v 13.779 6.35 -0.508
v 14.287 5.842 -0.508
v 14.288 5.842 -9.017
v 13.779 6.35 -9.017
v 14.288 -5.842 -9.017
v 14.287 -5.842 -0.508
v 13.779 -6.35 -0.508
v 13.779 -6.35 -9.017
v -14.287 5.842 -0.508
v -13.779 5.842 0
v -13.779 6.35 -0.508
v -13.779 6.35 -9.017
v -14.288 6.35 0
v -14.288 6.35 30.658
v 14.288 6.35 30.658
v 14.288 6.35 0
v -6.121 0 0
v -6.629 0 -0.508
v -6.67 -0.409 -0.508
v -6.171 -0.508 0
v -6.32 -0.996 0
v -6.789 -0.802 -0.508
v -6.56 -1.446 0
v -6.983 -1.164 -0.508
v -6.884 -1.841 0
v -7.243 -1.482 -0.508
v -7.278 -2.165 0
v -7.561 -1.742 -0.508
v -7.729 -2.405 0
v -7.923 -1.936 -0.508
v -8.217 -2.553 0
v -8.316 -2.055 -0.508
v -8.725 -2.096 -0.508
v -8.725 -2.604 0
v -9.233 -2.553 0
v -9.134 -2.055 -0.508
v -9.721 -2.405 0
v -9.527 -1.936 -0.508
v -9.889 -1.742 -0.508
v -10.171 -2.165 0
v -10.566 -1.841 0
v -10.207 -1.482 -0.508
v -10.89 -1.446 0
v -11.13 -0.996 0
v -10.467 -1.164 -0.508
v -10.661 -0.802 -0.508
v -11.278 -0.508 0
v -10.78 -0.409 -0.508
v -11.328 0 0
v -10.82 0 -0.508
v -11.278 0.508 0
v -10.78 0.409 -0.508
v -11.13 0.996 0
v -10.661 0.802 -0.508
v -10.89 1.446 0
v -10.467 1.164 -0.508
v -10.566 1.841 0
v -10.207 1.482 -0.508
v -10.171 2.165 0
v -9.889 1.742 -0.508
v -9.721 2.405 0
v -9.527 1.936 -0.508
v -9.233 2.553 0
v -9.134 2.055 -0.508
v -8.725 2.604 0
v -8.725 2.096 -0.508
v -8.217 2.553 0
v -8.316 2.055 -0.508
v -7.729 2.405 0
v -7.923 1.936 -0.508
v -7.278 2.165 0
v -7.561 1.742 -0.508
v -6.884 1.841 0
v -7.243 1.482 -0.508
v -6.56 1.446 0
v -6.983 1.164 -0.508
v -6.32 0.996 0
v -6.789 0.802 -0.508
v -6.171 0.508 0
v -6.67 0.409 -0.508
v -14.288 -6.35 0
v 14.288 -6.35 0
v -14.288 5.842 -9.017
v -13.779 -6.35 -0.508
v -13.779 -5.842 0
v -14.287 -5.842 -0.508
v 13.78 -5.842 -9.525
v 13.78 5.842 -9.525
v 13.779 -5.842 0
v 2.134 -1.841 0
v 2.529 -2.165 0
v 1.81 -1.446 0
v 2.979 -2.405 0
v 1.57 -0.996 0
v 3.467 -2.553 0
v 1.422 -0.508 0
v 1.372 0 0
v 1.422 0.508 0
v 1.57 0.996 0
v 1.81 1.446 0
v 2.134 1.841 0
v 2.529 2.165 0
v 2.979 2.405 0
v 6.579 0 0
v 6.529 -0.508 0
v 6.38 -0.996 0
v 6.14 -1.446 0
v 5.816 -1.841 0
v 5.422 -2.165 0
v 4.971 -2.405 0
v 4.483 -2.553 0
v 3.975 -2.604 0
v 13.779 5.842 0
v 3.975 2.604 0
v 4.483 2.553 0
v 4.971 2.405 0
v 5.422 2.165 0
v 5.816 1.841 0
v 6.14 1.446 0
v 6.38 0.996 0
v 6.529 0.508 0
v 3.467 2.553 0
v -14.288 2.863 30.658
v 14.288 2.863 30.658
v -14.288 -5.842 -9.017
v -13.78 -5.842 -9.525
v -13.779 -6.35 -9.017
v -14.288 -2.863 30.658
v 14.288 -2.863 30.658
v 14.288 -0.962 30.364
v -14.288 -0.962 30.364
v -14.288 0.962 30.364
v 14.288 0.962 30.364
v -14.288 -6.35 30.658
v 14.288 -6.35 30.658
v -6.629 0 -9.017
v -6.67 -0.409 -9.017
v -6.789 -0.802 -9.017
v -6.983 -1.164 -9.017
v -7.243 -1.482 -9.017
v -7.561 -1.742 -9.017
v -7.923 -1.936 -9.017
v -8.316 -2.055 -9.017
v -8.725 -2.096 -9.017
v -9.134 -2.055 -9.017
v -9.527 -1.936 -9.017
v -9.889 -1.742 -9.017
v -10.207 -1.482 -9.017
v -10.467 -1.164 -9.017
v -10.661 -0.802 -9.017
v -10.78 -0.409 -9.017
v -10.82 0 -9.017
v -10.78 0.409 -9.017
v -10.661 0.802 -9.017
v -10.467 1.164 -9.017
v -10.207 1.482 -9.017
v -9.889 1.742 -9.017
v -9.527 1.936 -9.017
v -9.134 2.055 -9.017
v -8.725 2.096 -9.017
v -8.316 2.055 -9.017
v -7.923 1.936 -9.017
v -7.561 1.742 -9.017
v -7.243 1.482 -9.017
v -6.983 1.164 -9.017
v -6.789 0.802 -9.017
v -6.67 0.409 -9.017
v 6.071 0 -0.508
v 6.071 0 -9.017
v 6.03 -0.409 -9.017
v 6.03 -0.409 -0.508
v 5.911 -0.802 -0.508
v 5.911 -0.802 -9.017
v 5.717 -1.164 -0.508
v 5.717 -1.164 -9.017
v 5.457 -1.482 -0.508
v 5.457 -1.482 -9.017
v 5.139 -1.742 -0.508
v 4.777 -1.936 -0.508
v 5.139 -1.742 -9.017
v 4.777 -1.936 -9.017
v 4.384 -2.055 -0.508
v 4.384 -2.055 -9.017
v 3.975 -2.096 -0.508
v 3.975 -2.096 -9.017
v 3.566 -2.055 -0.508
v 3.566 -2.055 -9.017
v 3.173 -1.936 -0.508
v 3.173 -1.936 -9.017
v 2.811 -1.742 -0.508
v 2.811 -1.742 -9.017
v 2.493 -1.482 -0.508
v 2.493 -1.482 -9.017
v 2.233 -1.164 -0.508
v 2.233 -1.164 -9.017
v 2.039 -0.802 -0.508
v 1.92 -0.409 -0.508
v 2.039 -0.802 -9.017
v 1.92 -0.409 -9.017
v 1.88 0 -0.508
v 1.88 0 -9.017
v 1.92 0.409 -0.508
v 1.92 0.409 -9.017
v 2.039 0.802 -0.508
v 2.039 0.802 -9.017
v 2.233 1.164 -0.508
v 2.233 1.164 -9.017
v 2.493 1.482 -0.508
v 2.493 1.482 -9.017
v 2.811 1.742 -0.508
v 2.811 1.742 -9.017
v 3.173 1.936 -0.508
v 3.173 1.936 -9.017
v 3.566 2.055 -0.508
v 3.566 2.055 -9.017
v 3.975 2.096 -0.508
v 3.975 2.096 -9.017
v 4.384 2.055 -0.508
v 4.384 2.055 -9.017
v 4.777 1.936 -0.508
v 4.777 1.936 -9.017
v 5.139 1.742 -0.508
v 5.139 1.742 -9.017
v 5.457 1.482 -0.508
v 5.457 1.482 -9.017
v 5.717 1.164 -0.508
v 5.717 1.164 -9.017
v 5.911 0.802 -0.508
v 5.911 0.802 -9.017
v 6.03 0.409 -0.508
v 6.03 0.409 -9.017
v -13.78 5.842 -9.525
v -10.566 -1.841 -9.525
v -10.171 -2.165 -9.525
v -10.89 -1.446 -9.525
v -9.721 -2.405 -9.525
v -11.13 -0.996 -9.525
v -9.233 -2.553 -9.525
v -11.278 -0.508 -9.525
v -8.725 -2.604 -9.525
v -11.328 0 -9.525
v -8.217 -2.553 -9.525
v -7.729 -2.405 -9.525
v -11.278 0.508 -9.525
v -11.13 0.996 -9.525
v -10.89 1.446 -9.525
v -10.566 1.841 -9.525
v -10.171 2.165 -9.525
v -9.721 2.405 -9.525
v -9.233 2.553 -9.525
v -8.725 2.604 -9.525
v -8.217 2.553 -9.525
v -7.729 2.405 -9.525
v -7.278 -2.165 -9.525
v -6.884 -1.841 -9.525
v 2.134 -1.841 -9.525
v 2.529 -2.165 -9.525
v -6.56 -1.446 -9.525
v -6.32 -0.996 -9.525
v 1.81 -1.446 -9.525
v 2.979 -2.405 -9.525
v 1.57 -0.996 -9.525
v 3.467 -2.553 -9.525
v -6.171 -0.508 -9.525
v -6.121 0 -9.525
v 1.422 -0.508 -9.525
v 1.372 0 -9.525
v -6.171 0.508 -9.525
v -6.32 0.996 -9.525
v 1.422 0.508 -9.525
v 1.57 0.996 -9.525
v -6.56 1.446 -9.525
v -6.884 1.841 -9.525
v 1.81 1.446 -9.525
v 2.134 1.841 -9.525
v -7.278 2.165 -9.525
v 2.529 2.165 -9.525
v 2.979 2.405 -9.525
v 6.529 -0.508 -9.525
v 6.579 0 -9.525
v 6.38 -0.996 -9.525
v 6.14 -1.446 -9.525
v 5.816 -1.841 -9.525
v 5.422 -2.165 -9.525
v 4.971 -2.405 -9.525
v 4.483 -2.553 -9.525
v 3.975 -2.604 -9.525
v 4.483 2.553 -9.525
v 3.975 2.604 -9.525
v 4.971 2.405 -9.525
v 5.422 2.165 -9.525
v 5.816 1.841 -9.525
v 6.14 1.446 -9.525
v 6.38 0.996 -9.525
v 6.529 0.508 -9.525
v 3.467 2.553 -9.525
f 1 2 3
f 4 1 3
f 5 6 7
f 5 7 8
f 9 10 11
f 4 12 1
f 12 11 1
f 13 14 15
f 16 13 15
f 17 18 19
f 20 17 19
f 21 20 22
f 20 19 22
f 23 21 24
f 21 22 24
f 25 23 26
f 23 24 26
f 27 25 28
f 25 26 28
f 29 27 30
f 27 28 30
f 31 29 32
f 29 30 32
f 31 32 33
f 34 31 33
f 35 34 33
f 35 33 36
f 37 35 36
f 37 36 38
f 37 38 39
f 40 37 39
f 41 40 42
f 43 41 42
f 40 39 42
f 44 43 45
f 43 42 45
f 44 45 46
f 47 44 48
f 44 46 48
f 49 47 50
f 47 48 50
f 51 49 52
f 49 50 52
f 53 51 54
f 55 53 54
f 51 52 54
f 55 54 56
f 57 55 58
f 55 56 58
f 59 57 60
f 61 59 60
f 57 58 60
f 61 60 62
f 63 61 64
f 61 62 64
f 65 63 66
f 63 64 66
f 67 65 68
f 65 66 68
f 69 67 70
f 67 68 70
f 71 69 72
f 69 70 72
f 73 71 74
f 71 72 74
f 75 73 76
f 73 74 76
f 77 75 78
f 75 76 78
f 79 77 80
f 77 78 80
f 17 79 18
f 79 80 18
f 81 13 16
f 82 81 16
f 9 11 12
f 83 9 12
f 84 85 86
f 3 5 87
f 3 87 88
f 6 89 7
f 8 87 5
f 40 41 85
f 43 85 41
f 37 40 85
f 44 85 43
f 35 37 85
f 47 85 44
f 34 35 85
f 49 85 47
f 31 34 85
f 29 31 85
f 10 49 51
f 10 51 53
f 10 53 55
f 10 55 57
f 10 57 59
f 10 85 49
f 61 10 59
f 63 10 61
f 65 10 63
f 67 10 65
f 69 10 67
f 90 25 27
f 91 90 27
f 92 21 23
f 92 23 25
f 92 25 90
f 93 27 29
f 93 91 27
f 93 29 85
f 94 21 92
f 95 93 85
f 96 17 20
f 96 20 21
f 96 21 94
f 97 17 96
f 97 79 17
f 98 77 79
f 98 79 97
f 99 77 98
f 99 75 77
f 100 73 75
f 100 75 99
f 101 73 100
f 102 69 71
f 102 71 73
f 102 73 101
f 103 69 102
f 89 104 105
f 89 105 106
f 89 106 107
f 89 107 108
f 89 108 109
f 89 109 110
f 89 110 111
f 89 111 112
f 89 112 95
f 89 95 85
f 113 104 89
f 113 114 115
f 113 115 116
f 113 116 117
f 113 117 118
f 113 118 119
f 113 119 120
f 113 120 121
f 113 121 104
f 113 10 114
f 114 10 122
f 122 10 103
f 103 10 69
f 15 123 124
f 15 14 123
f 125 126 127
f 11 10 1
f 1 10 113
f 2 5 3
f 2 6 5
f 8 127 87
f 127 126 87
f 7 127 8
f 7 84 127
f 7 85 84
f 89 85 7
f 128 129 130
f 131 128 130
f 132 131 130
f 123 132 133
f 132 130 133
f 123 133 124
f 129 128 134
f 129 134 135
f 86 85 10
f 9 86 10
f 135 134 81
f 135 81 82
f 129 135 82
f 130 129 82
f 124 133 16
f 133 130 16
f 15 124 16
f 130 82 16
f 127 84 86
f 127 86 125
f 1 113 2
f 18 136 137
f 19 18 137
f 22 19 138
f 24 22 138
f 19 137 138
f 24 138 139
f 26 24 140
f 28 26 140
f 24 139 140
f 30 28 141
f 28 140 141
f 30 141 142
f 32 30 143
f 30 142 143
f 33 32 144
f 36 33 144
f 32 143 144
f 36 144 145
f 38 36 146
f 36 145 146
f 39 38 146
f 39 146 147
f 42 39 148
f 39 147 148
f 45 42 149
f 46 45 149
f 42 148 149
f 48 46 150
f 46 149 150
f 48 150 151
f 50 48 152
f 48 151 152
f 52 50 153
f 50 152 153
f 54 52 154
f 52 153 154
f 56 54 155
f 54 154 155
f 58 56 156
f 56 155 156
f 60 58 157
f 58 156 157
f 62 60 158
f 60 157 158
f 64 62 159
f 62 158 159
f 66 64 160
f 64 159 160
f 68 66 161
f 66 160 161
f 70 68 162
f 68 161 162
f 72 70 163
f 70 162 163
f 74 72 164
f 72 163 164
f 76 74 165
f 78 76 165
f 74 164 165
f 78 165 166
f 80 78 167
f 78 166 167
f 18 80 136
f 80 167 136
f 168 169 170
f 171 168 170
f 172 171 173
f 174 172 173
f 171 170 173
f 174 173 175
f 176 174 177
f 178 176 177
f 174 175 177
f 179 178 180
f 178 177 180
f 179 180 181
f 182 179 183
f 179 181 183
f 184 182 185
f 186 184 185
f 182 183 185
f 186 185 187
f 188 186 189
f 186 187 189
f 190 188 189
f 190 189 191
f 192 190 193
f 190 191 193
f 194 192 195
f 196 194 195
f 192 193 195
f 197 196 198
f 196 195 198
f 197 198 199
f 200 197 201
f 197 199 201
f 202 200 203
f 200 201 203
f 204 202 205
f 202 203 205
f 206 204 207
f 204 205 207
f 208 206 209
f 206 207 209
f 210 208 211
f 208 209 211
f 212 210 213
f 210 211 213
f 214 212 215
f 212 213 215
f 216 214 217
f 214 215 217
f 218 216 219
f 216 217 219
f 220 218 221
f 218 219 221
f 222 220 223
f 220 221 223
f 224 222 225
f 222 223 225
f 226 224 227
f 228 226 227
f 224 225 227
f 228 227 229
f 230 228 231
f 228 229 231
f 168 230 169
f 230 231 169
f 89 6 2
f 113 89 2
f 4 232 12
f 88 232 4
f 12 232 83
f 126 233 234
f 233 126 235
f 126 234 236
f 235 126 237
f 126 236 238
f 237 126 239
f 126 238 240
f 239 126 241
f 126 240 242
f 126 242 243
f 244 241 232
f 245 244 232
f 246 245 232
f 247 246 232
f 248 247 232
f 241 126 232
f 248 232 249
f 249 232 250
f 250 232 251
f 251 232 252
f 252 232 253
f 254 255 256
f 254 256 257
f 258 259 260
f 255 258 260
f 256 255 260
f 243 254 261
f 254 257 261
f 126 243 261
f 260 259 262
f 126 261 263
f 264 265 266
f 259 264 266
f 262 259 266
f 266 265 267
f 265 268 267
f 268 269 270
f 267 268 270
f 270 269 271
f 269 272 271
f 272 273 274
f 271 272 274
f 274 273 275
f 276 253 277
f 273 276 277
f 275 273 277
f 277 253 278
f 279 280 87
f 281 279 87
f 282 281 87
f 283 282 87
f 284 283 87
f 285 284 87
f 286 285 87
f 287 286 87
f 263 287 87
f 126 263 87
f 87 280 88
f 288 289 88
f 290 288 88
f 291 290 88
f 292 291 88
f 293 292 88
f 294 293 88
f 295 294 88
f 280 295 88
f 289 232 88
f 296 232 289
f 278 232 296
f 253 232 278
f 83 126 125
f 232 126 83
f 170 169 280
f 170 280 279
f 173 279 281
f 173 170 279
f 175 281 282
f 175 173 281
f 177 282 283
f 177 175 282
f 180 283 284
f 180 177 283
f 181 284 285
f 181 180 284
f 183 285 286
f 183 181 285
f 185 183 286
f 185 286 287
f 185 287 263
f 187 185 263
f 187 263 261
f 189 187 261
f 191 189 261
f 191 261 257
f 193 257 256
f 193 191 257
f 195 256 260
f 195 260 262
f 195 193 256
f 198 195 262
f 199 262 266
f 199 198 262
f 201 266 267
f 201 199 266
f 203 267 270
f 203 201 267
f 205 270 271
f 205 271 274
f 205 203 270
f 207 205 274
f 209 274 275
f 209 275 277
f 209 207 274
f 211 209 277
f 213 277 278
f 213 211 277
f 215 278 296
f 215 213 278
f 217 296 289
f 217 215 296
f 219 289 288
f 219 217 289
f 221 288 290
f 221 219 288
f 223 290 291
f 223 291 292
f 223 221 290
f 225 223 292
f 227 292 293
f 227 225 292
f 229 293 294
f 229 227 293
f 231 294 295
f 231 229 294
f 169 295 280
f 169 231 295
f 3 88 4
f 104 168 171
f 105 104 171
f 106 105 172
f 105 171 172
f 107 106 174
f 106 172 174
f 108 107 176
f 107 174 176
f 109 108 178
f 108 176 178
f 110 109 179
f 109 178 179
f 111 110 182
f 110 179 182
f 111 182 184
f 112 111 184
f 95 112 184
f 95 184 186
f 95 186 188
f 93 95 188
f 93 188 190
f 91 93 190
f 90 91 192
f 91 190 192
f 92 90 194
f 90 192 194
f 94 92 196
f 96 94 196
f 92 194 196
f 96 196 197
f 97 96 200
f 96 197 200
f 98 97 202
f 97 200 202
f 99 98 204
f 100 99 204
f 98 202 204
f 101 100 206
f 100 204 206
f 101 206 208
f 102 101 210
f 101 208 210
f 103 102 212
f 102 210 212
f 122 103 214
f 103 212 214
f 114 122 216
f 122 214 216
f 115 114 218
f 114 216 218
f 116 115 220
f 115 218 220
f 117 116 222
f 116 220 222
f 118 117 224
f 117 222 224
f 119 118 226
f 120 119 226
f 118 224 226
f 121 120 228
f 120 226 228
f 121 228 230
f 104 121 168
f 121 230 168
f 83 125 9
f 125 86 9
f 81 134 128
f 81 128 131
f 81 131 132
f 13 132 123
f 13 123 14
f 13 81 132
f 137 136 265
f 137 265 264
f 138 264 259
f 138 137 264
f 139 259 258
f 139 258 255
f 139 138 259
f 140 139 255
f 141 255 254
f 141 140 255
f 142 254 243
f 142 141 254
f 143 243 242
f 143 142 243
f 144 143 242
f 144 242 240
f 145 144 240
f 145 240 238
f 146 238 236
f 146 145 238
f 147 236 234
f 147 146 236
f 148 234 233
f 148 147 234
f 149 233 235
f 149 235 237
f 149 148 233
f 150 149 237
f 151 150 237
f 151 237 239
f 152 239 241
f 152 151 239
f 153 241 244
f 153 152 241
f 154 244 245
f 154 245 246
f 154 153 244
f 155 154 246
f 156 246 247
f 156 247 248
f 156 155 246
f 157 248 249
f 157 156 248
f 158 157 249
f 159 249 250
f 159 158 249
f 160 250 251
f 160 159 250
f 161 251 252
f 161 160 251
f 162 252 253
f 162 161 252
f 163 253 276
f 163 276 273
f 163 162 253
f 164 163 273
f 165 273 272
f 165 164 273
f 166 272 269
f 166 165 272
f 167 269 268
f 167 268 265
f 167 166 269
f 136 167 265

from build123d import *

# Parameters (mm, degrees)
F0_W          = 28.575
F0_H          = 12.7
F1_DEPTH      = 9.525
F2_DEPTH      = 30.6578
F3_R          = 12.573
F4_DEPTH      = 14.2885
F4_DEPTH_BACK = 14.2885
F5_R          = 2.0955
F6_DEPTH      = 9.525
F7_SIZE       = 0.508


with BuildPart() as f1:
    # F0 (on Top) → F1 (new body)
    with BuildSketch(Plane.XY):
        Rectangle(F0_W, F0_H)
    extrude(amount=-F1_DEPTH)


with BuildPart() as f2:
    # F2 (new): a face of the model
    f2_faces = [f1.part.faces().sort_by_distance(p)[0] for p in [
        (0, 0, 0),
    ]]
    extrude(f2_faces, amount=F2_DEPTH)

    # F3 (on Right) → F4 (cut, two sides)
    with BuildSketch(Plane.YZ) as f4_sk:
        with Locations((0, 42.9006)):
            Circle(F3_R)
    extrude(amount=-F4_DEPTH, mode=Mode.SUBTRACT)
    extrude(f4_sk.sketch, amount=F4_DEPTH_BACK, mode=Mode.SUBTRACT)


with BuildPart() as f1_1:
    add(f1.part)

    # F5 (on face) → F6 (cut, through all)
    with BuildSketch(Plane(origin=(0, 0, -9.525), x_dir=(1, 0, 0), z_dir=(0, 0, -1))):
        with Locations((-8.7249, 0)):
            Circle(F5_R)
        with Locations((3.9751, 0)):
            Circle(F5_R)
    extrude(amount=-F6_DEPTH, mode=Mode.SUBTRACT)

    # F7
    f7_edges = [f1_1.edges().sort_by_distance(p)[0] for p in [
        (0, -6.35, -9.525),
        (-14.2875, 0, -9.525),
        (14.2875, 0, -9.525),
        (0, 6.35, -9.525),
        (-10.8204, 0, -9.525),
        (1.8796, 0, -9.525),
        (0, -6.35, 0),
        (-14.2875, 0, 0),
        (14.2875, 0, 0),
        (0, 6.35, 0),
        (-10.8204, 0, 0),
        (1.8796, 0, 0),
        (-14.2875, -6.35, -4.7625),
        (14.2875, -6.35, -4.7625),
        (14.2875, 6.35, -4.7625),
        (-14.2875, 6.35, -4.7625),
    ]]
    chamfer(f7_edges, length=F7_SIZE)


solid = Compound([f2.part, f1_1.part])
